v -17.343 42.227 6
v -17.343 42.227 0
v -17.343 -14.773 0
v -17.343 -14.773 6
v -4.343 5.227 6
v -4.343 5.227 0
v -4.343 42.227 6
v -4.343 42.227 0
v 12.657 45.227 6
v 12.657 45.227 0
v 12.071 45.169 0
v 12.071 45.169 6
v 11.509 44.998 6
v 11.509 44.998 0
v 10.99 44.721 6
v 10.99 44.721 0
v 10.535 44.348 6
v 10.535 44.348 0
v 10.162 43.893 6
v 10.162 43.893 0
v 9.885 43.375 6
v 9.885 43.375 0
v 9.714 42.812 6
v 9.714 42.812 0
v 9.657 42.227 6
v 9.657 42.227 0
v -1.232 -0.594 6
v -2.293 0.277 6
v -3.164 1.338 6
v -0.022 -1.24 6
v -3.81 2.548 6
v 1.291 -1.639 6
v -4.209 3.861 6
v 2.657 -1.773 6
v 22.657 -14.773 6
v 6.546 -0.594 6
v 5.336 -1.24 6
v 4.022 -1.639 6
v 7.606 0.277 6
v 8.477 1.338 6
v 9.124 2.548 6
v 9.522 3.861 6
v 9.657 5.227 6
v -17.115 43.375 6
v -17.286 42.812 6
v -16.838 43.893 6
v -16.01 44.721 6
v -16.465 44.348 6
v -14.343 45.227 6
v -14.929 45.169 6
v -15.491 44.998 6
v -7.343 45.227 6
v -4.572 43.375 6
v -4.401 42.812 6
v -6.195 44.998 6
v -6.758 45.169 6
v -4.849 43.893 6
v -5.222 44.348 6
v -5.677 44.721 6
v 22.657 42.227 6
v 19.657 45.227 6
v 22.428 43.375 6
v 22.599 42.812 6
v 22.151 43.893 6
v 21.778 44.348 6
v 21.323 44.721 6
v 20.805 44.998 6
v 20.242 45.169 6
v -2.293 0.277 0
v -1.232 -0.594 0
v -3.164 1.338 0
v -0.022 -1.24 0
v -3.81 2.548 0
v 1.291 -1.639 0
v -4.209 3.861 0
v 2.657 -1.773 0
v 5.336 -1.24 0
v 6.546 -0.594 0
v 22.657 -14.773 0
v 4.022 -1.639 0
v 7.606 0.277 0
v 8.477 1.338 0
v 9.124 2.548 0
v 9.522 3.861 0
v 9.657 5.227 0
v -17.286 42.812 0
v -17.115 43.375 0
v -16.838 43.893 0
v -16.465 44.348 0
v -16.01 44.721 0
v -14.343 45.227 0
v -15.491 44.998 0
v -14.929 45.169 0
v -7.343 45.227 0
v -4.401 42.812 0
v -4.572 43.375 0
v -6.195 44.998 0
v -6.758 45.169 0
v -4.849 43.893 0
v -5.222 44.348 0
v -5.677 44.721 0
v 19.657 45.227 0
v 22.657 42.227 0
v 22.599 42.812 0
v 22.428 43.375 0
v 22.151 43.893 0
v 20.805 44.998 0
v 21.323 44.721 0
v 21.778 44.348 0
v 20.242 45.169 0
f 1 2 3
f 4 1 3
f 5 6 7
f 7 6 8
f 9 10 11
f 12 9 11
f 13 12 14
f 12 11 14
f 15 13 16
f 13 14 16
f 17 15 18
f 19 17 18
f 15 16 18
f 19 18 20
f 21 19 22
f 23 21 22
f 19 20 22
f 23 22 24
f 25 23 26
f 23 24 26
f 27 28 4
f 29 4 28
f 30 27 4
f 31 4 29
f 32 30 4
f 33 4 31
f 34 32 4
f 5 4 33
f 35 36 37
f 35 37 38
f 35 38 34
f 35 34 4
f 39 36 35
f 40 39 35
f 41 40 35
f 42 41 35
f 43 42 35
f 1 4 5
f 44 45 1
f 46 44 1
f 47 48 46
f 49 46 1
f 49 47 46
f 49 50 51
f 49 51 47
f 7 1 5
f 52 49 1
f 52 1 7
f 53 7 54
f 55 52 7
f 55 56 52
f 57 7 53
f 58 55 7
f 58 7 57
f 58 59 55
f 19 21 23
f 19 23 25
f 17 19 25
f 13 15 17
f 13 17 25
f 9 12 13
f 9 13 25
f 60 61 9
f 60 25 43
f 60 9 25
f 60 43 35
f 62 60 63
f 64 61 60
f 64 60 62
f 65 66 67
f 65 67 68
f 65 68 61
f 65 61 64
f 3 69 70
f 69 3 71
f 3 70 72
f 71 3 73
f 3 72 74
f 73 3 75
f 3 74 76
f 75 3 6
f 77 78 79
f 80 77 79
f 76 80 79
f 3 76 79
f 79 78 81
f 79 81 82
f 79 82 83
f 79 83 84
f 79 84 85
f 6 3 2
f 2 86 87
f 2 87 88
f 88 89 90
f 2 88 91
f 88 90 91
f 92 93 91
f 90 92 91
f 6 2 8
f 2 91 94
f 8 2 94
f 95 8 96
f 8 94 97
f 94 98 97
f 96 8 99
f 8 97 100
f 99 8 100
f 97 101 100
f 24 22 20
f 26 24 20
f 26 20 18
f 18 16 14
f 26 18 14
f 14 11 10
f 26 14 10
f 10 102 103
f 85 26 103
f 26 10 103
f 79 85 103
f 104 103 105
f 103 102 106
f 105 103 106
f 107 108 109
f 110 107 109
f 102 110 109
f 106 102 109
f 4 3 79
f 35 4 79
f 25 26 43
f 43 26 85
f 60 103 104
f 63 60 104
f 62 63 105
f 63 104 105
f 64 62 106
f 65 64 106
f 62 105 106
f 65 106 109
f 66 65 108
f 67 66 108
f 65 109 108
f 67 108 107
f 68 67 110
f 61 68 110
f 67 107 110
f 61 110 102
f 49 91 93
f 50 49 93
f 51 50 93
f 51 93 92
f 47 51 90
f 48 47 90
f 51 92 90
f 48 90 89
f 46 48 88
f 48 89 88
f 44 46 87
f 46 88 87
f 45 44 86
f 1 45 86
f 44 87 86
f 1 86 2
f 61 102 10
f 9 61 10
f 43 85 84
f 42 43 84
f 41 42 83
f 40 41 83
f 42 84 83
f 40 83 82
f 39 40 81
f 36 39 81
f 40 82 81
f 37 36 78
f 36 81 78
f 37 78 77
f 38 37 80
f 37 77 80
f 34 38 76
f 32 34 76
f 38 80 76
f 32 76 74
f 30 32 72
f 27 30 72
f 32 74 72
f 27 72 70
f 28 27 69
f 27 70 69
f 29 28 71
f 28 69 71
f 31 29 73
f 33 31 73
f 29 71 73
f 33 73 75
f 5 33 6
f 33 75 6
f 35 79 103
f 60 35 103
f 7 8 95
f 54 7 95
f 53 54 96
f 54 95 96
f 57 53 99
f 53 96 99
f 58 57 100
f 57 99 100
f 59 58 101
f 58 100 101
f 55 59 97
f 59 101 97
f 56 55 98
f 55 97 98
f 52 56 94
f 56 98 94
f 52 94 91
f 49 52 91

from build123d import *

# Parameters (mm, degrees)
F1_DEPTH = 6


with BuildPart() as f1:
    # F0 (on Top) → F1 (new body)
    with BuildSketch(Plane.XY):
        with BuildLine():
            Line((-17.343273, -14.773325), (22.656727, -14.773325))
            Line((22.656727, -14.773325), (22.656727, 42.226675))
            ThreePointArc((22.656727, 42.226675), (21.778048, 44.347996), (19.656727, 45.226675))
            Line((19.656727, 45.226675), (12.656727, 45.226675))
            ThreePointArc((12.656727, 45.226675), (10.535407, 44.347996), (9.656727, 42.226675))
            Line((9.656727, 42.226675), (9.656727, 5.226675))
            ThreePointArc((9.656727, 5.226675), (2.656727, -1.773325), (-4.343273, 5.226675))
            Line((-4.343273, 5.226675), (-4.343273, 42.226675))
            ThreePointArc((-4.343273, 42.226675), (-5.221952, 44.347996), (-7.343273, 45.226675))
            Line((-7.343273, 45.226675), (-14.343273, 45.226675))
            ThreePointArc((-14.343273, 45.226675), (-16.464593, 44.347996), (-17.343273, 42.226675))
            Line((-17.343273, 42.226675), (-17.343273, -14.773325))
        make_face()
    extrude(amount=F1_DEPTH)


solid = f1.part
